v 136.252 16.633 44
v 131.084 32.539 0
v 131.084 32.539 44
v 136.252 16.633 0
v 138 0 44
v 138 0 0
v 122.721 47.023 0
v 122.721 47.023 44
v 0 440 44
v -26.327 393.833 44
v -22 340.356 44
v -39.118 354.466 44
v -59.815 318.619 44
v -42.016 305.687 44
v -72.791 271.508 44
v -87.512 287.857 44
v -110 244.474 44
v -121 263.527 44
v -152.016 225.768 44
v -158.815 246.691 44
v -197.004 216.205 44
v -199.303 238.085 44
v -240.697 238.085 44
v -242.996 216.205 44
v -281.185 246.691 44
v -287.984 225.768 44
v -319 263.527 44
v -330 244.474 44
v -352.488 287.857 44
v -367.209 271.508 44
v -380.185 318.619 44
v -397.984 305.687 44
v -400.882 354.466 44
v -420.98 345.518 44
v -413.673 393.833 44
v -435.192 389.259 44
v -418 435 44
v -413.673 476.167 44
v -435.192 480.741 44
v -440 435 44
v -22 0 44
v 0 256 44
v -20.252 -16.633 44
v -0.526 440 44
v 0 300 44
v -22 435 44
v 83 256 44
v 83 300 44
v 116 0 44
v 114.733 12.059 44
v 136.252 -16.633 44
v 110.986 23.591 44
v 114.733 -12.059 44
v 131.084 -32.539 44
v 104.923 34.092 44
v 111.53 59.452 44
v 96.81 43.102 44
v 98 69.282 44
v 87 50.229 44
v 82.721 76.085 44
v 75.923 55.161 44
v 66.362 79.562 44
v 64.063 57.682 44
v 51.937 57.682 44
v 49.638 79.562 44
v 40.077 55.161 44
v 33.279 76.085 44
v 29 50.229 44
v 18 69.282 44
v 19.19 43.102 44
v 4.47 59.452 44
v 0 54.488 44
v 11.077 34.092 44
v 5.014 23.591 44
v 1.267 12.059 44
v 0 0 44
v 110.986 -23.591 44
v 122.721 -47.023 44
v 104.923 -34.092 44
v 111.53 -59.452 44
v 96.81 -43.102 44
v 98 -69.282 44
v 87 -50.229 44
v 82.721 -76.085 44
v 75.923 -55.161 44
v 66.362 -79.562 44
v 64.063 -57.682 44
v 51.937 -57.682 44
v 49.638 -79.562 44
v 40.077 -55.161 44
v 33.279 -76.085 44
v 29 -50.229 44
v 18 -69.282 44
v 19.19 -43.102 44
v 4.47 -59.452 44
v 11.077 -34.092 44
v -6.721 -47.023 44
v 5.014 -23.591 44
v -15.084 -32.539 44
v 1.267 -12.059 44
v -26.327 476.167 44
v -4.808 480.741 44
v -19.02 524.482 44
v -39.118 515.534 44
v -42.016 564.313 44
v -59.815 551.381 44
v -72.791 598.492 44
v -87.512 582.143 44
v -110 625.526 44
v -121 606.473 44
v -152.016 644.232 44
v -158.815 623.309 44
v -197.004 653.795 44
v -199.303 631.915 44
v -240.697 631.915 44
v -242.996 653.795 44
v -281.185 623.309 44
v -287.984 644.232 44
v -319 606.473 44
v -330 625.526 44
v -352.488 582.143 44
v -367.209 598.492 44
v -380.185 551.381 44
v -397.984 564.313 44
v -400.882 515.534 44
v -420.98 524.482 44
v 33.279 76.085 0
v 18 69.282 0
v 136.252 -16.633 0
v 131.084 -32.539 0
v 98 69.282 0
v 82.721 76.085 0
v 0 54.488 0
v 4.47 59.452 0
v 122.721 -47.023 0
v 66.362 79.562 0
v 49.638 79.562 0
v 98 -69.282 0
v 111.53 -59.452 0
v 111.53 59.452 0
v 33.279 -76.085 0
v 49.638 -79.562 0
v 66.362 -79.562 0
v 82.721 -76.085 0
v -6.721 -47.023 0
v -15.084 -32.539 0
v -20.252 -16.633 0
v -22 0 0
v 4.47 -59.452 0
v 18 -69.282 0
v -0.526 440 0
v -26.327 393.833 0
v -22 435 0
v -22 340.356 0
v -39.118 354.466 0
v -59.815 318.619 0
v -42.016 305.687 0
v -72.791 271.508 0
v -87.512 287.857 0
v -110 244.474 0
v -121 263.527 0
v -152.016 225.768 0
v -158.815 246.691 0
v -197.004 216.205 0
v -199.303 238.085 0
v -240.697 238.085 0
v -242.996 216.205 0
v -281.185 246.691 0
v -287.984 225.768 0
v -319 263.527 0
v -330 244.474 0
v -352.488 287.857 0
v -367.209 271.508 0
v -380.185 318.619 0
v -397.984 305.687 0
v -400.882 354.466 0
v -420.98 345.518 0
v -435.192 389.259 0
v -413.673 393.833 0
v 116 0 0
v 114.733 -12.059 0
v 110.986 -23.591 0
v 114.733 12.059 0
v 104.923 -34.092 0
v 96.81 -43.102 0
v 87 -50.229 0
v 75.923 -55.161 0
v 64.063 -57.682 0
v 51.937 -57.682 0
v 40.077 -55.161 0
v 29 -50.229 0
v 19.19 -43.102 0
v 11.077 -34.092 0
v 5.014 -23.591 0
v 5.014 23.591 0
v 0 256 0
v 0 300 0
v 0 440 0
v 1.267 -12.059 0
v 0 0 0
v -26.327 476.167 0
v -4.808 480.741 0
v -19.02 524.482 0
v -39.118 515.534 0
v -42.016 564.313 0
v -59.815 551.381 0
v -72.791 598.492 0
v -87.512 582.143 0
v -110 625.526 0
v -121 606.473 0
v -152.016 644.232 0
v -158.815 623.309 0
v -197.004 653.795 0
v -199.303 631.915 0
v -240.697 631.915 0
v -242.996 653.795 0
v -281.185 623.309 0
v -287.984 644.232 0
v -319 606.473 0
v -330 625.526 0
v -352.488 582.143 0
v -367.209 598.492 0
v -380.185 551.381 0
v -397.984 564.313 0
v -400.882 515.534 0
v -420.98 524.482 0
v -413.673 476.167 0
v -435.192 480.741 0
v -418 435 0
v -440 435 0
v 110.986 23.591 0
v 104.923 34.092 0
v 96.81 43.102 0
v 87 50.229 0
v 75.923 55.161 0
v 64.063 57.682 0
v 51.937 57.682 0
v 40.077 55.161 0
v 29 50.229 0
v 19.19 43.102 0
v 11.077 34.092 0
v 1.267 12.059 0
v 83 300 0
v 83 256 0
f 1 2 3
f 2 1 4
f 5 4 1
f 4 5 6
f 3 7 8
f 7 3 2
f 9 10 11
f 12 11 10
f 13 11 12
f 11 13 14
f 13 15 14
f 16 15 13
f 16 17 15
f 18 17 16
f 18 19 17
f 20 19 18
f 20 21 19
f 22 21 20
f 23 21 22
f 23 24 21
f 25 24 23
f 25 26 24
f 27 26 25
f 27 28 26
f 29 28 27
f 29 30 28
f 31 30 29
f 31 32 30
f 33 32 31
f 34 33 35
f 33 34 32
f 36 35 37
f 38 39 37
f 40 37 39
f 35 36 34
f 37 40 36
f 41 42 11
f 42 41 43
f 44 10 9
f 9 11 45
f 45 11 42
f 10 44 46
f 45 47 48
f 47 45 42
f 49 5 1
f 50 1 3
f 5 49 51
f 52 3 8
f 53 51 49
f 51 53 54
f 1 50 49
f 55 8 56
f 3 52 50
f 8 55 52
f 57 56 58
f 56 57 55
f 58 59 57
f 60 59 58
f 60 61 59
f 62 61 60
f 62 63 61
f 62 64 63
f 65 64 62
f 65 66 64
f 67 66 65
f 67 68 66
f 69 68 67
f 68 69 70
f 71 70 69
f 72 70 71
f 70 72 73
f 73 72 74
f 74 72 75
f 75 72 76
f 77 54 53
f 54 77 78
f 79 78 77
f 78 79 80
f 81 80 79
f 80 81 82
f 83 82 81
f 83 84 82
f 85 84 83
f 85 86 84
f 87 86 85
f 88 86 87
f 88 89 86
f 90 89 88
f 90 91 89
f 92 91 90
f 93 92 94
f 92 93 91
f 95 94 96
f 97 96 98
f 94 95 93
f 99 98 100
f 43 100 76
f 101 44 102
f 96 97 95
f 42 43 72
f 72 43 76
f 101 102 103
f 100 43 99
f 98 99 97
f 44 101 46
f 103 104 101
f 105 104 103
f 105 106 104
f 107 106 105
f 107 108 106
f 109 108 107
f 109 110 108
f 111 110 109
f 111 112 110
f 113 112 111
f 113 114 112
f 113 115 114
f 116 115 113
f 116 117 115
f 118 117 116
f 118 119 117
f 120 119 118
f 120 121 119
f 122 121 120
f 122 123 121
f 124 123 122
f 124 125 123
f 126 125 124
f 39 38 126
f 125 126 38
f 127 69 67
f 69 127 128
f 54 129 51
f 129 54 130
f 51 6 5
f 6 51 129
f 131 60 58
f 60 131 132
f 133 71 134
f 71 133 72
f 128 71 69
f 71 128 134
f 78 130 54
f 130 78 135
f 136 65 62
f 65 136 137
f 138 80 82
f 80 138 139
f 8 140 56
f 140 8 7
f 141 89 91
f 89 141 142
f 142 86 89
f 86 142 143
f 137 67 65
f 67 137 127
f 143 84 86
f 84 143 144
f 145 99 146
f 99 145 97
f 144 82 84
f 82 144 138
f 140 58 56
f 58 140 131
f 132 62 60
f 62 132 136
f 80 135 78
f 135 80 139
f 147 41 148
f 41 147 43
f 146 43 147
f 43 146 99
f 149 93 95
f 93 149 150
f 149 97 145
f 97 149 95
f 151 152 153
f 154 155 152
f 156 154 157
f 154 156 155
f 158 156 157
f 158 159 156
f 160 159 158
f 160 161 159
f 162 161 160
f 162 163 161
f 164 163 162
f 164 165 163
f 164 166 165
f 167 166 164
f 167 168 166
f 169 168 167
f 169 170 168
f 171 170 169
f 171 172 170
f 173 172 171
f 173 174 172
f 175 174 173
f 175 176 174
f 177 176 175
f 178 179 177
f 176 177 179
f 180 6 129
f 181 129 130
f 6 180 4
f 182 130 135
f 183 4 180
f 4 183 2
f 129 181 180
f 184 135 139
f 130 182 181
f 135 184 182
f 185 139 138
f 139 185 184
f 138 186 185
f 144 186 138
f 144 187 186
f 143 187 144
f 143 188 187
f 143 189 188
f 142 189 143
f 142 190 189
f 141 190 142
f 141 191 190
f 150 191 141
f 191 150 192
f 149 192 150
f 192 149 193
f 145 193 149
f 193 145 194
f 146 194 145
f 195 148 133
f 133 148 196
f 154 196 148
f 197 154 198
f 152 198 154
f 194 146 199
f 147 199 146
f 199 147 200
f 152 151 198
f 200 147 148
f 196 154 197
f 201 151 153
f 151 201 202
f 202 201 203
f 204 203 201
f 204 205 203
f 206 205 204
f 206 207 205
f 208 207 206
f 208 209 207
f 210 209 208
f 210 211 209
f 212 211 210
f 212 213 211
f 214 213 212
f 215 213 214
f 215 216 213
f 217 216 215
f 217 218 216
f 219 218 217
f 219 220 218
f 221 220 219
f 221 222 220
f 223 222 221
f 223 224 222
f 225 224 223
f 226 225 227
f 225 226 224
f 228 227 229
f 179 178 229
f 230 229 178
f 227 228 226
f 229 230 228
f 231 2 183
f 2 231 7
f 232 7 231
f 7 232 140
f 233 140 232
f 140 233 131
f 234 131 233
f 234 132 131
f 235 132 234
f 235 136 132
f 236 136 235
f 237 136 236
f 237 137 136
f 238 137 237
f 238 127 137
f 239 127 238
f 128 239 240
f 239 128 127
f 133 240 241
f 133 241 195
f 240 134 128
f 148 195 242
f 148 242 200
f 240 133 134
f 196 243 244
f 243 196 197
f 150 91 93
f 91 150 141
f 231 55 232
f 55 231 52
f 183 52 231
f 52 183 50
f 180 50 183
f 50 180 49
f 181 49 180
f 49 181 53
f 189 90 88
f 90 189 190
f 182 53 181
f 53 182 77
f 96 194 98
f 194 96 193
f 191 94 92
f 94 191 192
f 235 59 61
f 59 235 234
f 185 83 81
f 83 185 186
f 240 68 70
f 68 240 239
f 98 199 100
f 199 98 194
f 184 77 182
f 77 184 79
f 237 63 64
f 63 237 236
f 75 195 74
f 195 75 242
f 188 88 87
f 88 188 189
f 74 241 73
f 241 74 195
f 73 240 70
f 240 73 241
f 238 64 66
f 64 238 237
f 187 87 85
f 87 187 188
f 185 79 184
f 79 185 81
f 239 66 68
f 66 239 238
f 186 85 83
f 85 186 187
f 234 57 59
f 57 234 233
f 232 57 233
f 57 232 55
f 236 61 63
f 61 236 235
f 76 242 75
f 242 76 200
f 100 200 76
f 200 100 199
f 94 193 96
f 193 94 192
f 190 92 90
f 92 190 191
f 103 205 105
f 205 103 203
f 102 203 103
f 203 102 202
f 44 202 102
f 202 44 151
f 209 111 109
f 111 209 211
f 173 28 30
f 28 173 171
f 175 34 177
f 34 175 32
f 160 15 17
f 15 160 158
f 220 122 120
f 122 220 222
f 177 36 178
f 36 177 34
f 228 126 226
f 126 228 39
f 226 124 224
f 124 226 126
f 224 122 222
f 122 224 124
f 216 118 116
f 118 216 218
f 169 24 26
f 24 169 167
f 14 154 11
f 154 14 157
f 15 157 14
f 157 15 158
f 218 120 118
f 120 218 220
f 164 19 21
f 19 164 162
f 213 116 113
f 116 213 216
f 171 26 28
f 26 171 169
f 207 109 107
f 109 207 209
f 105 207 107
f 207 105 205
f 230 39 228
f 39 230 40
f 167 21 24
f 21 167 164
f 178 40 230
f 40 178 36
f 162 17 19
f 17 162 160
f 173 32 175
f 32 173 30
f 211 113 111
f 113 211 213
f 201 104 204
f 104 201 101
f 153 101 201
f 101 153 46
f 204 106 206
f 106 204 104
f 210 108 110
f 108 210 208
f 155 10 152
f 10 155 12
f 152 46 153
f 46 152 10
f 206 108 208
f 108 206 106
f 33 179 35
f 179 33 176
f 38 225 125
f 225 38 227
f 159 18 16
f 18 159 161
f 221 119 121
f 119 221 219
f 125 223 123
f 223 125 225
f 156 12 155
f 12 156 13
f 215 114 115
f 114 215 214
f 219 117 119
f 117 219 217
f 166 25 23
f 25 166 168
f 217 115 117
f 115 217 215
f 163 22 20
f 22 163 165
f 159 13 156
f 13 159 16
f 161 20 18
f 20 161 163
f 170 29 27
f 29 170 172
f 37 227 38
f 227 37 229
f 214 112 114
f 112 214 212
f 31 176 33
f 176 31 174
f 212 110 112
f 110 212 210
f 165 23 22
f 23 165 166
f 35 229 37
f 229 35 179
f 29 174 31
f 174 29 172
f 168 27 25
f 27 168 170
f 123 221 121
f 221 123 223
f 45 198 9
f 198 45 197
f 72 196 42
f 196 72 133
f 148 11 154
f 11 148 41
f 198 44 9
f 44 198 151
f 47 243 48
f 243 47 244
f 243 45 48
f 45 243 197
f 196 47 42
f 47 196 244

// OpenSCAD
peg_width = 44;

union() {
 // upper hook
 translate([160/2-peg_width/2,0,0]) difference(){
   cylinder(h=peg_width, d=160);
   translate([0,0,-1]) cylinder(h=46, d=160-peg_width);
   translate([0,0,0]) cube();
 }
 
 //connector block
 translate([-(peg_width/2),0,0]) cube([peg_width/2, 440, peg_width]);
 
 //transverse block
 translate([-(peg_width/2),256,0]) cube([105, peg_width, peg_width]);

//lower hook
 translate([-(440/2),435,0]) difference(){
   cylinder(h=peg_width, d=440);
   translate([0,0,-1]) cylinder(h=46, d=440-peg_width);
   translate([0,0,0]) cube();
 }
}
